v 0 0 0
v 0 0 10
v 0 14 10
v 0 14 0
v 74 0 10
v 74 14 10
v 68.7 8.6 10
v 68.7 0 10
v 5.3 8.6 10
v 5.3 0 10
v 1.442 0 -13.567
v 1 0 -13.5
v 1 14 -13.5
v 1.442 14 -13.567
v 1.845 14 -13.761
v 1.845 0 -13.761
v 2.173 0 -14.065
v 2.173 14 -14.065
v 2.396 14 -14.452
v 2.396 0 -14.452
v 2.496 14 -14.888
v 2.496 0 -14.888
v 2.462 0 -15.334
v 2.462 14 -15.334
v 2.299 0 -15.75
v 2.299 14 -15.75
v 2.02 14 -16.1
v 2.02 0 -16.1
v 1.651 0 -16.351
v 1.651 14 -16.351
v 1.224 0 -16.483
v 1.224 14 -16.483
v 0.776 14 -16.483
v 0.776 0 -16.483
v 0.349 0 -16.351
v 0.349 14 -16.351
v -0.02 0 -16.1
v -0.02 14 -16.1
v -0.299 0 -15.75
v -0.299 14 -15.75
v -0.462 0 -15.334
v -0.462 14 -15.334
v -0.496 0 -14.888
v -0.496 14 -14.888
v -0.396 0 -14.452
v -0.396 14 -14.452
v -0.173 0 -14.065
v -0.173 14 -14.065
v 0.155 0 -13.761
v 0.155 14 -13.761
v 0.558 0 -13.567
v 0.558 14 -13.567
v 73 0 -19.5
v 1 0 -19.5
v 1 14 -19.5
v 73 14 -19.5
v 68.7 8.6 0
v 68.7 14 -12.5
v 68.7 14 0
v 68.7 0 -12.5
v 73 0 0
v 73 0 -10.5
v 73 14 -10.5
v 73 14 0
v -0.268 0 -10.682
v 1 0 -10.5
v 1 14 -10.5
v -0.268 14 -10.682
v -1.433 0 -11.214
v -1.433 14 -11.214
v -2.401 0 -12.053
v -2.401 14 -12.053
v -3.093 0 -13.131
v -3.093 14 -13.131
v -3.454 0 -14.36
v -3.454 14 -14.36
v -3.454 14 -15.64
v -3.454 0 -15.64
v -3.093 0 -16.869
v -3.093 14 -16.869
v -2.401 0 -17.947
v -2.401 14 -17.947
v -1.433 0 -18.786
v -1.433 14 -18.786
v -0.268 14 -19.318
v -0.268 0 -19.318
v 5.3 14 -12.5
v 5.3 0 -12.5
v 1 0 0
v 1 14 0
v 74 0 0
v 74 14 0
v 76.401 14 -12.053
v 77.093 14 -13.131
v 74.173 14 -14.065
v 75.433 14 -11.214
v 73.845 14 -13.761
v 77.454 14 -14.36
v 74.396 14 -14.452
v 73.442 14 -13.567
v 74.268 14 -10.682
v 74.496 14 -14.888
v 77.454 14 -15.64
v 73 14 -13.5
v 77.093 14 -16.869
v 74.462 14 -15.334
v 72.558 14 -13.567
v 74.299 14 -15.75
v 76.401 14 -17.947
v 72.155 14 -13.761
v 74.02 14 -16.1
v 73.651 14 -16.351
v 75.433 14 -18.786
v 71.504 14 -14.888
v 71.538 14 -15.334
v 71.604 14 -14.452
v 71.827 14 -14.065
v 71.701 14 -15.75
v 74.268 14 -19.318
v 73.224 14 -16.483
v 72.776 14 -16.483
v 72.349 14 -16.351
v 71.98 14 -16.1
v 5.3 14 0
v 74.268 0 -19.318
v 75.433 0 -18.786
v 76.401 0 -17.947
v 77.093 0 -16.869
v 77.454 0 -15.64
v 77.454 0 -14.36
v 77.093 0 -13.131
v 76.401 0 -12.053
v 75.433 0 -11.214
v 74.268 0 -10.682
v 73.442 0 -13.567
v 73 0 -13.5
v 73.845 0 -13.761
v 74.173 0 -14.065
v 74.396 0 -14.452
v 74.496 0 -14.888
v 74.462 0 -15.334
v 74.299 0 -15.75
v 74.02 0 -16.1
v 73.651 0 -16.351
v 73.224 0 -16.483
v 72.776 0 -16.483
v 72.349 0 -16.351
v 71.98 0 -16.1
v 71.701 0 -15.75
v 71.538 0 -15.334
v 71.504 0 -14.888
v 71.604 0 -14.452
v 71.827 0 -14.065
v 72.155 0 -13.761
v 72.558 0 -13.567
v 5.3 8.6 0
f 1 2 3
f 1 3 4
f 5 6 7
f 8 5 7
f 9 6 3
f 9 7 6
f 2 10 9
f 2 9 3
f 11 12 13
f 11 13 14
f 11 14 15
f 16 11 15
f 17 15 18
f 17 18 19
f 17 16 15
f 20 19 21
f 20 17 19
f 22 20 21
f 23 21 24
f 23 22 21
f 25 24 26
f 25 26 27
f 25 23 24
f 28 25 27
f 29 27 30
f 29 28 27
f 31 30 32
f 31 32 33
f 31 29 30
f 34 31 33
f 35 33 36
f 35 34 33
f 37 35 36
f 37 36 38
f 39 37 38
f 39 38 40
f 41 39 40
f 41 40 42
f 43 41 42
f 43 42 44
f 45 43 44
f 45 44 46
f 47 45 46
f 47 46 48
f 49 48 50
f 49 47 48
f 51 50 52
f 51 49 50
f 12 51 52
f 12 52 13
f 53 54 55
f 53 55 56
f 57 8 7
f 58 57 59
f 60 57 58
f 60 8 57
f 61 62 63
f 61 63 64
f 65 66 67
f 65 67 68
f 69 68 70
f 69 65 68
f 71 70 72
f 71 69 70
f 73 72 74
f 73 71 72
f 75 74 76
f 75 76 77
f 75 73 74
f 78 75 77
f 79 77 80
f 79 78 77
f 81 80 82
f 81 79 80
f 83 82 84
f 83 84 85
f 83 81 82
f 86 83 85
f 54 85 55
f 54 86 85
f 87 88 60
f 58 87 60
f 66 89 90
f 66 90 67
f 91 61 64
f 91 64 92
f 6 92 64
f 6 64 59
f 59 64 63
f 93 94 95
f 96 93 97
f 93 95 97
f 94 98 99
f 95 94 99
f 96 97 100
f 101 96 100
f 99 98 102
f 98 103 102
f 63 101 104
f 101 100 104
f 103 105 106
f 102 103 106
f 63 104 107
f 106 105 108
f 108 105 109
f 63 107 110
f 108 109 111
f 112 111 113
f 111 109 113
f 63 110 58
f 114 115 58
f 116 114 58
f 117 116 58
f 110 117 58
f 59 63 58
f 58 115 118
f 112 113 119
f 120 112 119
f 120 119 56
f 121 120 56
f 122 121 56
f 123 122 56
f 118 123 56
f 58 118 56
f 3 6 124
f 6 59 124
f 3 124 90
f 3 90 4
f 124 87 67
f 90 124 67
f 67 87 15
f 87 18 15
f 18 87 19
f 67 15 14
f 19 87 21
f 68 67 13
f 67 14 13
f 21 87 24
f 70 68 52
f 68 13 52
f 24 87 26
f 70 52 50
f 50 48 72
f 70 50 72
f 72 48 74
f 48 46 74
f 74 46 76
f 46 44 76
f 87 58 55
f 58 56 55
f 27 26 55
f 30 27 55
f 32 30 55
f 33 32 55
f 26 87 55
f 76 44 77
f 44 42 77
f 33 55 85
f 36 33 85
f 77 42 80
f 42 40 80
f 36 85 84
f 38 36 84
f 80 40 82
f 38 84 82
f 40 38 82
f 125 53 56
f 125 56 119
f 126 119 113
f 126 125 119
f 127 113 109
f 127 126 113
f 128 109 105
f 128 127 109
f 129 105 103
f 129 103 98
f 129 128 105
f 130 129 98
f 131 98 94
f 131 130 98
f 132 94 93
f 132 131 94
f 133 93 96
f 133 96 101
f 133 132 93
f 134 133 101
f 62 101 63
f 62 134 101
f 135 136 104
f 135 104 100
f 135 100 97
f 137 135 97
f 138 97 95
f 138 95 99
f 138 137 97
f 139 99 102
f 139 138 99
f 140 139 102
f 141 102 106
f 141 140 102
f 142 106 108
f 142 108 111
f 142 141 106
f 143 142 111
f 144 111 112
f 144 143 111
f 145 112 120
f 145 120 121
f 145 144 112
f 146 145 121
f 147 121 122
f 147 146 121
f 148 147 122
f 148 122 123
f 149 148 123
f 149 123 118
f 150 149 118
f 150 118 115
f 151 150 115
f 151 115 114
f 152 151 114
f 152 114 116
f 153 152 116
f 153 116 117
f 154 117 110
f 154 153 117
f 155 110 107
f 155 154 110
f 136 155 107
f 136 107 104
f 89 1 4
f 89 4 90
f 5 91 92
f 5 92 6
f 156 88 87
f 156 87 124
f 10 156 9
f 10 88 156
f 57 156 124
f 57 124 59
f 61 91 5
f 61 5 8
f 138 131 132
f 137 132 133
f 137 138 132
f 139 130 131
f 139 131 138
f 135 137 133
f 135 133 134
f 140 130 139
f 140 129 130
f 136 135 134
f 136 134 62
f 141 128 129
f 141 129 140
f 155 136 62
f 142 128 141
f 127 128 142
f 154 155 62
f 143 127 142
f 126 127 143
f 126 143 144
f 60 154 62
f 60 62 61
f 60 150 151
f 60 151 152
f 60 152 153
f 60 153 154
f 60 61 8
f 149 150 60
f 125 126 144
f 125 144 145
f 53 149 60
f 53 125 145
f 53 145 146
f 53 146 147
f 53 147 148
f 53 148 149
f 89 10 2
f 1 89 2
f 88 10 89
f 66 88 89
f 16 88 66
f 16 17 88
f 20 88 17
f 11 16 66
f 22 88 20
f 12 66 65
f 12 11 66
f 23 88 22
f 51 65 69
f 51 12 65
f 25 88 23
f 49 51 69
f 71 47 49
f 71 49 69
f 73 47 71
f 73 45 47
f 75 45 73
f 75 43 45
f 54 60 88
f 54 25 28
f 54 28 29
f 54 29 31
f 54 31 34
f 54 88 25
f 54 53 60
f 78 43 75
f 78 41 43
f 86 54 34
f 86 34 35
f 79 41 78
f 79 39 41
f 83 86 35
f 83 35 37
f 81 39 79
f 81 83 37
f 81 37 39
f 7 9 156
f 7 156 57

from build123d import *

# Parameters (mm, degrees)
SKETCH_1_R          = 1.5
SKETCH_1_W          = 63.4
SKETCH_1_H          = 12.5
EXTRUDE_1_DEPTH     = 14
SKETCH_2_W          = 63.4
SKETCH_2_H          = 10
CUT_EXTRUDE_1_DEPTH = 8.6


with BuildPart() as part:
    # Эскиз1 → Бобышка-Вытянуть1 (new body)
    with BuildSketch(Plane(origin=(0, 0, 0), x_dir=(1, 0, 0), z_dir=(0, 1, 0))):
        with BuildLine():
            Line((0, 0), (1, 0))
            Line((1, 0), (1, 10.5))
            ThreePointArc((1, 10.5), (-3.5, 15), (1, 19.5))
            Line((1, 19.5), (73, 19.5))
            ThreePointArc((73, 19.5), (77.5, 15), (73, 10.5))
            Line((73, 10.5), (73, 0))
            Line((73, 0), (74, 0))
            Line((74, 0), (74, -10))
            Line((74, -10), (0, -10))
            Line((0, -10), (0, 0))
        make_face()
        with Locations(Location((1, 15, 0), (0, 0, 270))):
            Circle(SKETCH_1_R, mode=Mode.SUBTRACT)
        with Locations(Location((73, 15, 0), (0, 0, 270))):
            Circle(SKETCH_1_R, mode=Mode.SUBTRACT)
        with Locations((37, 6.25)):
            Rectangle(SKETCH_1_W, SKETCH_1_H, mode=Mode.SUBTRACT)
    extrude(amount=EXTRUDE_1_DEPTH)

    # Эскиз2 → Вырез-Вытянуть1 (cut)
    with BuildSketch(Plane.XZ):
        with Locations((37, 5)):
            Rectangle(SKETCH_2_W, SKETCH_2_H)
    extrude(amount=-CUT_EXTRUDE_1_DEPTH, mode=Mode.SUBTRACT)


solid = part.part
